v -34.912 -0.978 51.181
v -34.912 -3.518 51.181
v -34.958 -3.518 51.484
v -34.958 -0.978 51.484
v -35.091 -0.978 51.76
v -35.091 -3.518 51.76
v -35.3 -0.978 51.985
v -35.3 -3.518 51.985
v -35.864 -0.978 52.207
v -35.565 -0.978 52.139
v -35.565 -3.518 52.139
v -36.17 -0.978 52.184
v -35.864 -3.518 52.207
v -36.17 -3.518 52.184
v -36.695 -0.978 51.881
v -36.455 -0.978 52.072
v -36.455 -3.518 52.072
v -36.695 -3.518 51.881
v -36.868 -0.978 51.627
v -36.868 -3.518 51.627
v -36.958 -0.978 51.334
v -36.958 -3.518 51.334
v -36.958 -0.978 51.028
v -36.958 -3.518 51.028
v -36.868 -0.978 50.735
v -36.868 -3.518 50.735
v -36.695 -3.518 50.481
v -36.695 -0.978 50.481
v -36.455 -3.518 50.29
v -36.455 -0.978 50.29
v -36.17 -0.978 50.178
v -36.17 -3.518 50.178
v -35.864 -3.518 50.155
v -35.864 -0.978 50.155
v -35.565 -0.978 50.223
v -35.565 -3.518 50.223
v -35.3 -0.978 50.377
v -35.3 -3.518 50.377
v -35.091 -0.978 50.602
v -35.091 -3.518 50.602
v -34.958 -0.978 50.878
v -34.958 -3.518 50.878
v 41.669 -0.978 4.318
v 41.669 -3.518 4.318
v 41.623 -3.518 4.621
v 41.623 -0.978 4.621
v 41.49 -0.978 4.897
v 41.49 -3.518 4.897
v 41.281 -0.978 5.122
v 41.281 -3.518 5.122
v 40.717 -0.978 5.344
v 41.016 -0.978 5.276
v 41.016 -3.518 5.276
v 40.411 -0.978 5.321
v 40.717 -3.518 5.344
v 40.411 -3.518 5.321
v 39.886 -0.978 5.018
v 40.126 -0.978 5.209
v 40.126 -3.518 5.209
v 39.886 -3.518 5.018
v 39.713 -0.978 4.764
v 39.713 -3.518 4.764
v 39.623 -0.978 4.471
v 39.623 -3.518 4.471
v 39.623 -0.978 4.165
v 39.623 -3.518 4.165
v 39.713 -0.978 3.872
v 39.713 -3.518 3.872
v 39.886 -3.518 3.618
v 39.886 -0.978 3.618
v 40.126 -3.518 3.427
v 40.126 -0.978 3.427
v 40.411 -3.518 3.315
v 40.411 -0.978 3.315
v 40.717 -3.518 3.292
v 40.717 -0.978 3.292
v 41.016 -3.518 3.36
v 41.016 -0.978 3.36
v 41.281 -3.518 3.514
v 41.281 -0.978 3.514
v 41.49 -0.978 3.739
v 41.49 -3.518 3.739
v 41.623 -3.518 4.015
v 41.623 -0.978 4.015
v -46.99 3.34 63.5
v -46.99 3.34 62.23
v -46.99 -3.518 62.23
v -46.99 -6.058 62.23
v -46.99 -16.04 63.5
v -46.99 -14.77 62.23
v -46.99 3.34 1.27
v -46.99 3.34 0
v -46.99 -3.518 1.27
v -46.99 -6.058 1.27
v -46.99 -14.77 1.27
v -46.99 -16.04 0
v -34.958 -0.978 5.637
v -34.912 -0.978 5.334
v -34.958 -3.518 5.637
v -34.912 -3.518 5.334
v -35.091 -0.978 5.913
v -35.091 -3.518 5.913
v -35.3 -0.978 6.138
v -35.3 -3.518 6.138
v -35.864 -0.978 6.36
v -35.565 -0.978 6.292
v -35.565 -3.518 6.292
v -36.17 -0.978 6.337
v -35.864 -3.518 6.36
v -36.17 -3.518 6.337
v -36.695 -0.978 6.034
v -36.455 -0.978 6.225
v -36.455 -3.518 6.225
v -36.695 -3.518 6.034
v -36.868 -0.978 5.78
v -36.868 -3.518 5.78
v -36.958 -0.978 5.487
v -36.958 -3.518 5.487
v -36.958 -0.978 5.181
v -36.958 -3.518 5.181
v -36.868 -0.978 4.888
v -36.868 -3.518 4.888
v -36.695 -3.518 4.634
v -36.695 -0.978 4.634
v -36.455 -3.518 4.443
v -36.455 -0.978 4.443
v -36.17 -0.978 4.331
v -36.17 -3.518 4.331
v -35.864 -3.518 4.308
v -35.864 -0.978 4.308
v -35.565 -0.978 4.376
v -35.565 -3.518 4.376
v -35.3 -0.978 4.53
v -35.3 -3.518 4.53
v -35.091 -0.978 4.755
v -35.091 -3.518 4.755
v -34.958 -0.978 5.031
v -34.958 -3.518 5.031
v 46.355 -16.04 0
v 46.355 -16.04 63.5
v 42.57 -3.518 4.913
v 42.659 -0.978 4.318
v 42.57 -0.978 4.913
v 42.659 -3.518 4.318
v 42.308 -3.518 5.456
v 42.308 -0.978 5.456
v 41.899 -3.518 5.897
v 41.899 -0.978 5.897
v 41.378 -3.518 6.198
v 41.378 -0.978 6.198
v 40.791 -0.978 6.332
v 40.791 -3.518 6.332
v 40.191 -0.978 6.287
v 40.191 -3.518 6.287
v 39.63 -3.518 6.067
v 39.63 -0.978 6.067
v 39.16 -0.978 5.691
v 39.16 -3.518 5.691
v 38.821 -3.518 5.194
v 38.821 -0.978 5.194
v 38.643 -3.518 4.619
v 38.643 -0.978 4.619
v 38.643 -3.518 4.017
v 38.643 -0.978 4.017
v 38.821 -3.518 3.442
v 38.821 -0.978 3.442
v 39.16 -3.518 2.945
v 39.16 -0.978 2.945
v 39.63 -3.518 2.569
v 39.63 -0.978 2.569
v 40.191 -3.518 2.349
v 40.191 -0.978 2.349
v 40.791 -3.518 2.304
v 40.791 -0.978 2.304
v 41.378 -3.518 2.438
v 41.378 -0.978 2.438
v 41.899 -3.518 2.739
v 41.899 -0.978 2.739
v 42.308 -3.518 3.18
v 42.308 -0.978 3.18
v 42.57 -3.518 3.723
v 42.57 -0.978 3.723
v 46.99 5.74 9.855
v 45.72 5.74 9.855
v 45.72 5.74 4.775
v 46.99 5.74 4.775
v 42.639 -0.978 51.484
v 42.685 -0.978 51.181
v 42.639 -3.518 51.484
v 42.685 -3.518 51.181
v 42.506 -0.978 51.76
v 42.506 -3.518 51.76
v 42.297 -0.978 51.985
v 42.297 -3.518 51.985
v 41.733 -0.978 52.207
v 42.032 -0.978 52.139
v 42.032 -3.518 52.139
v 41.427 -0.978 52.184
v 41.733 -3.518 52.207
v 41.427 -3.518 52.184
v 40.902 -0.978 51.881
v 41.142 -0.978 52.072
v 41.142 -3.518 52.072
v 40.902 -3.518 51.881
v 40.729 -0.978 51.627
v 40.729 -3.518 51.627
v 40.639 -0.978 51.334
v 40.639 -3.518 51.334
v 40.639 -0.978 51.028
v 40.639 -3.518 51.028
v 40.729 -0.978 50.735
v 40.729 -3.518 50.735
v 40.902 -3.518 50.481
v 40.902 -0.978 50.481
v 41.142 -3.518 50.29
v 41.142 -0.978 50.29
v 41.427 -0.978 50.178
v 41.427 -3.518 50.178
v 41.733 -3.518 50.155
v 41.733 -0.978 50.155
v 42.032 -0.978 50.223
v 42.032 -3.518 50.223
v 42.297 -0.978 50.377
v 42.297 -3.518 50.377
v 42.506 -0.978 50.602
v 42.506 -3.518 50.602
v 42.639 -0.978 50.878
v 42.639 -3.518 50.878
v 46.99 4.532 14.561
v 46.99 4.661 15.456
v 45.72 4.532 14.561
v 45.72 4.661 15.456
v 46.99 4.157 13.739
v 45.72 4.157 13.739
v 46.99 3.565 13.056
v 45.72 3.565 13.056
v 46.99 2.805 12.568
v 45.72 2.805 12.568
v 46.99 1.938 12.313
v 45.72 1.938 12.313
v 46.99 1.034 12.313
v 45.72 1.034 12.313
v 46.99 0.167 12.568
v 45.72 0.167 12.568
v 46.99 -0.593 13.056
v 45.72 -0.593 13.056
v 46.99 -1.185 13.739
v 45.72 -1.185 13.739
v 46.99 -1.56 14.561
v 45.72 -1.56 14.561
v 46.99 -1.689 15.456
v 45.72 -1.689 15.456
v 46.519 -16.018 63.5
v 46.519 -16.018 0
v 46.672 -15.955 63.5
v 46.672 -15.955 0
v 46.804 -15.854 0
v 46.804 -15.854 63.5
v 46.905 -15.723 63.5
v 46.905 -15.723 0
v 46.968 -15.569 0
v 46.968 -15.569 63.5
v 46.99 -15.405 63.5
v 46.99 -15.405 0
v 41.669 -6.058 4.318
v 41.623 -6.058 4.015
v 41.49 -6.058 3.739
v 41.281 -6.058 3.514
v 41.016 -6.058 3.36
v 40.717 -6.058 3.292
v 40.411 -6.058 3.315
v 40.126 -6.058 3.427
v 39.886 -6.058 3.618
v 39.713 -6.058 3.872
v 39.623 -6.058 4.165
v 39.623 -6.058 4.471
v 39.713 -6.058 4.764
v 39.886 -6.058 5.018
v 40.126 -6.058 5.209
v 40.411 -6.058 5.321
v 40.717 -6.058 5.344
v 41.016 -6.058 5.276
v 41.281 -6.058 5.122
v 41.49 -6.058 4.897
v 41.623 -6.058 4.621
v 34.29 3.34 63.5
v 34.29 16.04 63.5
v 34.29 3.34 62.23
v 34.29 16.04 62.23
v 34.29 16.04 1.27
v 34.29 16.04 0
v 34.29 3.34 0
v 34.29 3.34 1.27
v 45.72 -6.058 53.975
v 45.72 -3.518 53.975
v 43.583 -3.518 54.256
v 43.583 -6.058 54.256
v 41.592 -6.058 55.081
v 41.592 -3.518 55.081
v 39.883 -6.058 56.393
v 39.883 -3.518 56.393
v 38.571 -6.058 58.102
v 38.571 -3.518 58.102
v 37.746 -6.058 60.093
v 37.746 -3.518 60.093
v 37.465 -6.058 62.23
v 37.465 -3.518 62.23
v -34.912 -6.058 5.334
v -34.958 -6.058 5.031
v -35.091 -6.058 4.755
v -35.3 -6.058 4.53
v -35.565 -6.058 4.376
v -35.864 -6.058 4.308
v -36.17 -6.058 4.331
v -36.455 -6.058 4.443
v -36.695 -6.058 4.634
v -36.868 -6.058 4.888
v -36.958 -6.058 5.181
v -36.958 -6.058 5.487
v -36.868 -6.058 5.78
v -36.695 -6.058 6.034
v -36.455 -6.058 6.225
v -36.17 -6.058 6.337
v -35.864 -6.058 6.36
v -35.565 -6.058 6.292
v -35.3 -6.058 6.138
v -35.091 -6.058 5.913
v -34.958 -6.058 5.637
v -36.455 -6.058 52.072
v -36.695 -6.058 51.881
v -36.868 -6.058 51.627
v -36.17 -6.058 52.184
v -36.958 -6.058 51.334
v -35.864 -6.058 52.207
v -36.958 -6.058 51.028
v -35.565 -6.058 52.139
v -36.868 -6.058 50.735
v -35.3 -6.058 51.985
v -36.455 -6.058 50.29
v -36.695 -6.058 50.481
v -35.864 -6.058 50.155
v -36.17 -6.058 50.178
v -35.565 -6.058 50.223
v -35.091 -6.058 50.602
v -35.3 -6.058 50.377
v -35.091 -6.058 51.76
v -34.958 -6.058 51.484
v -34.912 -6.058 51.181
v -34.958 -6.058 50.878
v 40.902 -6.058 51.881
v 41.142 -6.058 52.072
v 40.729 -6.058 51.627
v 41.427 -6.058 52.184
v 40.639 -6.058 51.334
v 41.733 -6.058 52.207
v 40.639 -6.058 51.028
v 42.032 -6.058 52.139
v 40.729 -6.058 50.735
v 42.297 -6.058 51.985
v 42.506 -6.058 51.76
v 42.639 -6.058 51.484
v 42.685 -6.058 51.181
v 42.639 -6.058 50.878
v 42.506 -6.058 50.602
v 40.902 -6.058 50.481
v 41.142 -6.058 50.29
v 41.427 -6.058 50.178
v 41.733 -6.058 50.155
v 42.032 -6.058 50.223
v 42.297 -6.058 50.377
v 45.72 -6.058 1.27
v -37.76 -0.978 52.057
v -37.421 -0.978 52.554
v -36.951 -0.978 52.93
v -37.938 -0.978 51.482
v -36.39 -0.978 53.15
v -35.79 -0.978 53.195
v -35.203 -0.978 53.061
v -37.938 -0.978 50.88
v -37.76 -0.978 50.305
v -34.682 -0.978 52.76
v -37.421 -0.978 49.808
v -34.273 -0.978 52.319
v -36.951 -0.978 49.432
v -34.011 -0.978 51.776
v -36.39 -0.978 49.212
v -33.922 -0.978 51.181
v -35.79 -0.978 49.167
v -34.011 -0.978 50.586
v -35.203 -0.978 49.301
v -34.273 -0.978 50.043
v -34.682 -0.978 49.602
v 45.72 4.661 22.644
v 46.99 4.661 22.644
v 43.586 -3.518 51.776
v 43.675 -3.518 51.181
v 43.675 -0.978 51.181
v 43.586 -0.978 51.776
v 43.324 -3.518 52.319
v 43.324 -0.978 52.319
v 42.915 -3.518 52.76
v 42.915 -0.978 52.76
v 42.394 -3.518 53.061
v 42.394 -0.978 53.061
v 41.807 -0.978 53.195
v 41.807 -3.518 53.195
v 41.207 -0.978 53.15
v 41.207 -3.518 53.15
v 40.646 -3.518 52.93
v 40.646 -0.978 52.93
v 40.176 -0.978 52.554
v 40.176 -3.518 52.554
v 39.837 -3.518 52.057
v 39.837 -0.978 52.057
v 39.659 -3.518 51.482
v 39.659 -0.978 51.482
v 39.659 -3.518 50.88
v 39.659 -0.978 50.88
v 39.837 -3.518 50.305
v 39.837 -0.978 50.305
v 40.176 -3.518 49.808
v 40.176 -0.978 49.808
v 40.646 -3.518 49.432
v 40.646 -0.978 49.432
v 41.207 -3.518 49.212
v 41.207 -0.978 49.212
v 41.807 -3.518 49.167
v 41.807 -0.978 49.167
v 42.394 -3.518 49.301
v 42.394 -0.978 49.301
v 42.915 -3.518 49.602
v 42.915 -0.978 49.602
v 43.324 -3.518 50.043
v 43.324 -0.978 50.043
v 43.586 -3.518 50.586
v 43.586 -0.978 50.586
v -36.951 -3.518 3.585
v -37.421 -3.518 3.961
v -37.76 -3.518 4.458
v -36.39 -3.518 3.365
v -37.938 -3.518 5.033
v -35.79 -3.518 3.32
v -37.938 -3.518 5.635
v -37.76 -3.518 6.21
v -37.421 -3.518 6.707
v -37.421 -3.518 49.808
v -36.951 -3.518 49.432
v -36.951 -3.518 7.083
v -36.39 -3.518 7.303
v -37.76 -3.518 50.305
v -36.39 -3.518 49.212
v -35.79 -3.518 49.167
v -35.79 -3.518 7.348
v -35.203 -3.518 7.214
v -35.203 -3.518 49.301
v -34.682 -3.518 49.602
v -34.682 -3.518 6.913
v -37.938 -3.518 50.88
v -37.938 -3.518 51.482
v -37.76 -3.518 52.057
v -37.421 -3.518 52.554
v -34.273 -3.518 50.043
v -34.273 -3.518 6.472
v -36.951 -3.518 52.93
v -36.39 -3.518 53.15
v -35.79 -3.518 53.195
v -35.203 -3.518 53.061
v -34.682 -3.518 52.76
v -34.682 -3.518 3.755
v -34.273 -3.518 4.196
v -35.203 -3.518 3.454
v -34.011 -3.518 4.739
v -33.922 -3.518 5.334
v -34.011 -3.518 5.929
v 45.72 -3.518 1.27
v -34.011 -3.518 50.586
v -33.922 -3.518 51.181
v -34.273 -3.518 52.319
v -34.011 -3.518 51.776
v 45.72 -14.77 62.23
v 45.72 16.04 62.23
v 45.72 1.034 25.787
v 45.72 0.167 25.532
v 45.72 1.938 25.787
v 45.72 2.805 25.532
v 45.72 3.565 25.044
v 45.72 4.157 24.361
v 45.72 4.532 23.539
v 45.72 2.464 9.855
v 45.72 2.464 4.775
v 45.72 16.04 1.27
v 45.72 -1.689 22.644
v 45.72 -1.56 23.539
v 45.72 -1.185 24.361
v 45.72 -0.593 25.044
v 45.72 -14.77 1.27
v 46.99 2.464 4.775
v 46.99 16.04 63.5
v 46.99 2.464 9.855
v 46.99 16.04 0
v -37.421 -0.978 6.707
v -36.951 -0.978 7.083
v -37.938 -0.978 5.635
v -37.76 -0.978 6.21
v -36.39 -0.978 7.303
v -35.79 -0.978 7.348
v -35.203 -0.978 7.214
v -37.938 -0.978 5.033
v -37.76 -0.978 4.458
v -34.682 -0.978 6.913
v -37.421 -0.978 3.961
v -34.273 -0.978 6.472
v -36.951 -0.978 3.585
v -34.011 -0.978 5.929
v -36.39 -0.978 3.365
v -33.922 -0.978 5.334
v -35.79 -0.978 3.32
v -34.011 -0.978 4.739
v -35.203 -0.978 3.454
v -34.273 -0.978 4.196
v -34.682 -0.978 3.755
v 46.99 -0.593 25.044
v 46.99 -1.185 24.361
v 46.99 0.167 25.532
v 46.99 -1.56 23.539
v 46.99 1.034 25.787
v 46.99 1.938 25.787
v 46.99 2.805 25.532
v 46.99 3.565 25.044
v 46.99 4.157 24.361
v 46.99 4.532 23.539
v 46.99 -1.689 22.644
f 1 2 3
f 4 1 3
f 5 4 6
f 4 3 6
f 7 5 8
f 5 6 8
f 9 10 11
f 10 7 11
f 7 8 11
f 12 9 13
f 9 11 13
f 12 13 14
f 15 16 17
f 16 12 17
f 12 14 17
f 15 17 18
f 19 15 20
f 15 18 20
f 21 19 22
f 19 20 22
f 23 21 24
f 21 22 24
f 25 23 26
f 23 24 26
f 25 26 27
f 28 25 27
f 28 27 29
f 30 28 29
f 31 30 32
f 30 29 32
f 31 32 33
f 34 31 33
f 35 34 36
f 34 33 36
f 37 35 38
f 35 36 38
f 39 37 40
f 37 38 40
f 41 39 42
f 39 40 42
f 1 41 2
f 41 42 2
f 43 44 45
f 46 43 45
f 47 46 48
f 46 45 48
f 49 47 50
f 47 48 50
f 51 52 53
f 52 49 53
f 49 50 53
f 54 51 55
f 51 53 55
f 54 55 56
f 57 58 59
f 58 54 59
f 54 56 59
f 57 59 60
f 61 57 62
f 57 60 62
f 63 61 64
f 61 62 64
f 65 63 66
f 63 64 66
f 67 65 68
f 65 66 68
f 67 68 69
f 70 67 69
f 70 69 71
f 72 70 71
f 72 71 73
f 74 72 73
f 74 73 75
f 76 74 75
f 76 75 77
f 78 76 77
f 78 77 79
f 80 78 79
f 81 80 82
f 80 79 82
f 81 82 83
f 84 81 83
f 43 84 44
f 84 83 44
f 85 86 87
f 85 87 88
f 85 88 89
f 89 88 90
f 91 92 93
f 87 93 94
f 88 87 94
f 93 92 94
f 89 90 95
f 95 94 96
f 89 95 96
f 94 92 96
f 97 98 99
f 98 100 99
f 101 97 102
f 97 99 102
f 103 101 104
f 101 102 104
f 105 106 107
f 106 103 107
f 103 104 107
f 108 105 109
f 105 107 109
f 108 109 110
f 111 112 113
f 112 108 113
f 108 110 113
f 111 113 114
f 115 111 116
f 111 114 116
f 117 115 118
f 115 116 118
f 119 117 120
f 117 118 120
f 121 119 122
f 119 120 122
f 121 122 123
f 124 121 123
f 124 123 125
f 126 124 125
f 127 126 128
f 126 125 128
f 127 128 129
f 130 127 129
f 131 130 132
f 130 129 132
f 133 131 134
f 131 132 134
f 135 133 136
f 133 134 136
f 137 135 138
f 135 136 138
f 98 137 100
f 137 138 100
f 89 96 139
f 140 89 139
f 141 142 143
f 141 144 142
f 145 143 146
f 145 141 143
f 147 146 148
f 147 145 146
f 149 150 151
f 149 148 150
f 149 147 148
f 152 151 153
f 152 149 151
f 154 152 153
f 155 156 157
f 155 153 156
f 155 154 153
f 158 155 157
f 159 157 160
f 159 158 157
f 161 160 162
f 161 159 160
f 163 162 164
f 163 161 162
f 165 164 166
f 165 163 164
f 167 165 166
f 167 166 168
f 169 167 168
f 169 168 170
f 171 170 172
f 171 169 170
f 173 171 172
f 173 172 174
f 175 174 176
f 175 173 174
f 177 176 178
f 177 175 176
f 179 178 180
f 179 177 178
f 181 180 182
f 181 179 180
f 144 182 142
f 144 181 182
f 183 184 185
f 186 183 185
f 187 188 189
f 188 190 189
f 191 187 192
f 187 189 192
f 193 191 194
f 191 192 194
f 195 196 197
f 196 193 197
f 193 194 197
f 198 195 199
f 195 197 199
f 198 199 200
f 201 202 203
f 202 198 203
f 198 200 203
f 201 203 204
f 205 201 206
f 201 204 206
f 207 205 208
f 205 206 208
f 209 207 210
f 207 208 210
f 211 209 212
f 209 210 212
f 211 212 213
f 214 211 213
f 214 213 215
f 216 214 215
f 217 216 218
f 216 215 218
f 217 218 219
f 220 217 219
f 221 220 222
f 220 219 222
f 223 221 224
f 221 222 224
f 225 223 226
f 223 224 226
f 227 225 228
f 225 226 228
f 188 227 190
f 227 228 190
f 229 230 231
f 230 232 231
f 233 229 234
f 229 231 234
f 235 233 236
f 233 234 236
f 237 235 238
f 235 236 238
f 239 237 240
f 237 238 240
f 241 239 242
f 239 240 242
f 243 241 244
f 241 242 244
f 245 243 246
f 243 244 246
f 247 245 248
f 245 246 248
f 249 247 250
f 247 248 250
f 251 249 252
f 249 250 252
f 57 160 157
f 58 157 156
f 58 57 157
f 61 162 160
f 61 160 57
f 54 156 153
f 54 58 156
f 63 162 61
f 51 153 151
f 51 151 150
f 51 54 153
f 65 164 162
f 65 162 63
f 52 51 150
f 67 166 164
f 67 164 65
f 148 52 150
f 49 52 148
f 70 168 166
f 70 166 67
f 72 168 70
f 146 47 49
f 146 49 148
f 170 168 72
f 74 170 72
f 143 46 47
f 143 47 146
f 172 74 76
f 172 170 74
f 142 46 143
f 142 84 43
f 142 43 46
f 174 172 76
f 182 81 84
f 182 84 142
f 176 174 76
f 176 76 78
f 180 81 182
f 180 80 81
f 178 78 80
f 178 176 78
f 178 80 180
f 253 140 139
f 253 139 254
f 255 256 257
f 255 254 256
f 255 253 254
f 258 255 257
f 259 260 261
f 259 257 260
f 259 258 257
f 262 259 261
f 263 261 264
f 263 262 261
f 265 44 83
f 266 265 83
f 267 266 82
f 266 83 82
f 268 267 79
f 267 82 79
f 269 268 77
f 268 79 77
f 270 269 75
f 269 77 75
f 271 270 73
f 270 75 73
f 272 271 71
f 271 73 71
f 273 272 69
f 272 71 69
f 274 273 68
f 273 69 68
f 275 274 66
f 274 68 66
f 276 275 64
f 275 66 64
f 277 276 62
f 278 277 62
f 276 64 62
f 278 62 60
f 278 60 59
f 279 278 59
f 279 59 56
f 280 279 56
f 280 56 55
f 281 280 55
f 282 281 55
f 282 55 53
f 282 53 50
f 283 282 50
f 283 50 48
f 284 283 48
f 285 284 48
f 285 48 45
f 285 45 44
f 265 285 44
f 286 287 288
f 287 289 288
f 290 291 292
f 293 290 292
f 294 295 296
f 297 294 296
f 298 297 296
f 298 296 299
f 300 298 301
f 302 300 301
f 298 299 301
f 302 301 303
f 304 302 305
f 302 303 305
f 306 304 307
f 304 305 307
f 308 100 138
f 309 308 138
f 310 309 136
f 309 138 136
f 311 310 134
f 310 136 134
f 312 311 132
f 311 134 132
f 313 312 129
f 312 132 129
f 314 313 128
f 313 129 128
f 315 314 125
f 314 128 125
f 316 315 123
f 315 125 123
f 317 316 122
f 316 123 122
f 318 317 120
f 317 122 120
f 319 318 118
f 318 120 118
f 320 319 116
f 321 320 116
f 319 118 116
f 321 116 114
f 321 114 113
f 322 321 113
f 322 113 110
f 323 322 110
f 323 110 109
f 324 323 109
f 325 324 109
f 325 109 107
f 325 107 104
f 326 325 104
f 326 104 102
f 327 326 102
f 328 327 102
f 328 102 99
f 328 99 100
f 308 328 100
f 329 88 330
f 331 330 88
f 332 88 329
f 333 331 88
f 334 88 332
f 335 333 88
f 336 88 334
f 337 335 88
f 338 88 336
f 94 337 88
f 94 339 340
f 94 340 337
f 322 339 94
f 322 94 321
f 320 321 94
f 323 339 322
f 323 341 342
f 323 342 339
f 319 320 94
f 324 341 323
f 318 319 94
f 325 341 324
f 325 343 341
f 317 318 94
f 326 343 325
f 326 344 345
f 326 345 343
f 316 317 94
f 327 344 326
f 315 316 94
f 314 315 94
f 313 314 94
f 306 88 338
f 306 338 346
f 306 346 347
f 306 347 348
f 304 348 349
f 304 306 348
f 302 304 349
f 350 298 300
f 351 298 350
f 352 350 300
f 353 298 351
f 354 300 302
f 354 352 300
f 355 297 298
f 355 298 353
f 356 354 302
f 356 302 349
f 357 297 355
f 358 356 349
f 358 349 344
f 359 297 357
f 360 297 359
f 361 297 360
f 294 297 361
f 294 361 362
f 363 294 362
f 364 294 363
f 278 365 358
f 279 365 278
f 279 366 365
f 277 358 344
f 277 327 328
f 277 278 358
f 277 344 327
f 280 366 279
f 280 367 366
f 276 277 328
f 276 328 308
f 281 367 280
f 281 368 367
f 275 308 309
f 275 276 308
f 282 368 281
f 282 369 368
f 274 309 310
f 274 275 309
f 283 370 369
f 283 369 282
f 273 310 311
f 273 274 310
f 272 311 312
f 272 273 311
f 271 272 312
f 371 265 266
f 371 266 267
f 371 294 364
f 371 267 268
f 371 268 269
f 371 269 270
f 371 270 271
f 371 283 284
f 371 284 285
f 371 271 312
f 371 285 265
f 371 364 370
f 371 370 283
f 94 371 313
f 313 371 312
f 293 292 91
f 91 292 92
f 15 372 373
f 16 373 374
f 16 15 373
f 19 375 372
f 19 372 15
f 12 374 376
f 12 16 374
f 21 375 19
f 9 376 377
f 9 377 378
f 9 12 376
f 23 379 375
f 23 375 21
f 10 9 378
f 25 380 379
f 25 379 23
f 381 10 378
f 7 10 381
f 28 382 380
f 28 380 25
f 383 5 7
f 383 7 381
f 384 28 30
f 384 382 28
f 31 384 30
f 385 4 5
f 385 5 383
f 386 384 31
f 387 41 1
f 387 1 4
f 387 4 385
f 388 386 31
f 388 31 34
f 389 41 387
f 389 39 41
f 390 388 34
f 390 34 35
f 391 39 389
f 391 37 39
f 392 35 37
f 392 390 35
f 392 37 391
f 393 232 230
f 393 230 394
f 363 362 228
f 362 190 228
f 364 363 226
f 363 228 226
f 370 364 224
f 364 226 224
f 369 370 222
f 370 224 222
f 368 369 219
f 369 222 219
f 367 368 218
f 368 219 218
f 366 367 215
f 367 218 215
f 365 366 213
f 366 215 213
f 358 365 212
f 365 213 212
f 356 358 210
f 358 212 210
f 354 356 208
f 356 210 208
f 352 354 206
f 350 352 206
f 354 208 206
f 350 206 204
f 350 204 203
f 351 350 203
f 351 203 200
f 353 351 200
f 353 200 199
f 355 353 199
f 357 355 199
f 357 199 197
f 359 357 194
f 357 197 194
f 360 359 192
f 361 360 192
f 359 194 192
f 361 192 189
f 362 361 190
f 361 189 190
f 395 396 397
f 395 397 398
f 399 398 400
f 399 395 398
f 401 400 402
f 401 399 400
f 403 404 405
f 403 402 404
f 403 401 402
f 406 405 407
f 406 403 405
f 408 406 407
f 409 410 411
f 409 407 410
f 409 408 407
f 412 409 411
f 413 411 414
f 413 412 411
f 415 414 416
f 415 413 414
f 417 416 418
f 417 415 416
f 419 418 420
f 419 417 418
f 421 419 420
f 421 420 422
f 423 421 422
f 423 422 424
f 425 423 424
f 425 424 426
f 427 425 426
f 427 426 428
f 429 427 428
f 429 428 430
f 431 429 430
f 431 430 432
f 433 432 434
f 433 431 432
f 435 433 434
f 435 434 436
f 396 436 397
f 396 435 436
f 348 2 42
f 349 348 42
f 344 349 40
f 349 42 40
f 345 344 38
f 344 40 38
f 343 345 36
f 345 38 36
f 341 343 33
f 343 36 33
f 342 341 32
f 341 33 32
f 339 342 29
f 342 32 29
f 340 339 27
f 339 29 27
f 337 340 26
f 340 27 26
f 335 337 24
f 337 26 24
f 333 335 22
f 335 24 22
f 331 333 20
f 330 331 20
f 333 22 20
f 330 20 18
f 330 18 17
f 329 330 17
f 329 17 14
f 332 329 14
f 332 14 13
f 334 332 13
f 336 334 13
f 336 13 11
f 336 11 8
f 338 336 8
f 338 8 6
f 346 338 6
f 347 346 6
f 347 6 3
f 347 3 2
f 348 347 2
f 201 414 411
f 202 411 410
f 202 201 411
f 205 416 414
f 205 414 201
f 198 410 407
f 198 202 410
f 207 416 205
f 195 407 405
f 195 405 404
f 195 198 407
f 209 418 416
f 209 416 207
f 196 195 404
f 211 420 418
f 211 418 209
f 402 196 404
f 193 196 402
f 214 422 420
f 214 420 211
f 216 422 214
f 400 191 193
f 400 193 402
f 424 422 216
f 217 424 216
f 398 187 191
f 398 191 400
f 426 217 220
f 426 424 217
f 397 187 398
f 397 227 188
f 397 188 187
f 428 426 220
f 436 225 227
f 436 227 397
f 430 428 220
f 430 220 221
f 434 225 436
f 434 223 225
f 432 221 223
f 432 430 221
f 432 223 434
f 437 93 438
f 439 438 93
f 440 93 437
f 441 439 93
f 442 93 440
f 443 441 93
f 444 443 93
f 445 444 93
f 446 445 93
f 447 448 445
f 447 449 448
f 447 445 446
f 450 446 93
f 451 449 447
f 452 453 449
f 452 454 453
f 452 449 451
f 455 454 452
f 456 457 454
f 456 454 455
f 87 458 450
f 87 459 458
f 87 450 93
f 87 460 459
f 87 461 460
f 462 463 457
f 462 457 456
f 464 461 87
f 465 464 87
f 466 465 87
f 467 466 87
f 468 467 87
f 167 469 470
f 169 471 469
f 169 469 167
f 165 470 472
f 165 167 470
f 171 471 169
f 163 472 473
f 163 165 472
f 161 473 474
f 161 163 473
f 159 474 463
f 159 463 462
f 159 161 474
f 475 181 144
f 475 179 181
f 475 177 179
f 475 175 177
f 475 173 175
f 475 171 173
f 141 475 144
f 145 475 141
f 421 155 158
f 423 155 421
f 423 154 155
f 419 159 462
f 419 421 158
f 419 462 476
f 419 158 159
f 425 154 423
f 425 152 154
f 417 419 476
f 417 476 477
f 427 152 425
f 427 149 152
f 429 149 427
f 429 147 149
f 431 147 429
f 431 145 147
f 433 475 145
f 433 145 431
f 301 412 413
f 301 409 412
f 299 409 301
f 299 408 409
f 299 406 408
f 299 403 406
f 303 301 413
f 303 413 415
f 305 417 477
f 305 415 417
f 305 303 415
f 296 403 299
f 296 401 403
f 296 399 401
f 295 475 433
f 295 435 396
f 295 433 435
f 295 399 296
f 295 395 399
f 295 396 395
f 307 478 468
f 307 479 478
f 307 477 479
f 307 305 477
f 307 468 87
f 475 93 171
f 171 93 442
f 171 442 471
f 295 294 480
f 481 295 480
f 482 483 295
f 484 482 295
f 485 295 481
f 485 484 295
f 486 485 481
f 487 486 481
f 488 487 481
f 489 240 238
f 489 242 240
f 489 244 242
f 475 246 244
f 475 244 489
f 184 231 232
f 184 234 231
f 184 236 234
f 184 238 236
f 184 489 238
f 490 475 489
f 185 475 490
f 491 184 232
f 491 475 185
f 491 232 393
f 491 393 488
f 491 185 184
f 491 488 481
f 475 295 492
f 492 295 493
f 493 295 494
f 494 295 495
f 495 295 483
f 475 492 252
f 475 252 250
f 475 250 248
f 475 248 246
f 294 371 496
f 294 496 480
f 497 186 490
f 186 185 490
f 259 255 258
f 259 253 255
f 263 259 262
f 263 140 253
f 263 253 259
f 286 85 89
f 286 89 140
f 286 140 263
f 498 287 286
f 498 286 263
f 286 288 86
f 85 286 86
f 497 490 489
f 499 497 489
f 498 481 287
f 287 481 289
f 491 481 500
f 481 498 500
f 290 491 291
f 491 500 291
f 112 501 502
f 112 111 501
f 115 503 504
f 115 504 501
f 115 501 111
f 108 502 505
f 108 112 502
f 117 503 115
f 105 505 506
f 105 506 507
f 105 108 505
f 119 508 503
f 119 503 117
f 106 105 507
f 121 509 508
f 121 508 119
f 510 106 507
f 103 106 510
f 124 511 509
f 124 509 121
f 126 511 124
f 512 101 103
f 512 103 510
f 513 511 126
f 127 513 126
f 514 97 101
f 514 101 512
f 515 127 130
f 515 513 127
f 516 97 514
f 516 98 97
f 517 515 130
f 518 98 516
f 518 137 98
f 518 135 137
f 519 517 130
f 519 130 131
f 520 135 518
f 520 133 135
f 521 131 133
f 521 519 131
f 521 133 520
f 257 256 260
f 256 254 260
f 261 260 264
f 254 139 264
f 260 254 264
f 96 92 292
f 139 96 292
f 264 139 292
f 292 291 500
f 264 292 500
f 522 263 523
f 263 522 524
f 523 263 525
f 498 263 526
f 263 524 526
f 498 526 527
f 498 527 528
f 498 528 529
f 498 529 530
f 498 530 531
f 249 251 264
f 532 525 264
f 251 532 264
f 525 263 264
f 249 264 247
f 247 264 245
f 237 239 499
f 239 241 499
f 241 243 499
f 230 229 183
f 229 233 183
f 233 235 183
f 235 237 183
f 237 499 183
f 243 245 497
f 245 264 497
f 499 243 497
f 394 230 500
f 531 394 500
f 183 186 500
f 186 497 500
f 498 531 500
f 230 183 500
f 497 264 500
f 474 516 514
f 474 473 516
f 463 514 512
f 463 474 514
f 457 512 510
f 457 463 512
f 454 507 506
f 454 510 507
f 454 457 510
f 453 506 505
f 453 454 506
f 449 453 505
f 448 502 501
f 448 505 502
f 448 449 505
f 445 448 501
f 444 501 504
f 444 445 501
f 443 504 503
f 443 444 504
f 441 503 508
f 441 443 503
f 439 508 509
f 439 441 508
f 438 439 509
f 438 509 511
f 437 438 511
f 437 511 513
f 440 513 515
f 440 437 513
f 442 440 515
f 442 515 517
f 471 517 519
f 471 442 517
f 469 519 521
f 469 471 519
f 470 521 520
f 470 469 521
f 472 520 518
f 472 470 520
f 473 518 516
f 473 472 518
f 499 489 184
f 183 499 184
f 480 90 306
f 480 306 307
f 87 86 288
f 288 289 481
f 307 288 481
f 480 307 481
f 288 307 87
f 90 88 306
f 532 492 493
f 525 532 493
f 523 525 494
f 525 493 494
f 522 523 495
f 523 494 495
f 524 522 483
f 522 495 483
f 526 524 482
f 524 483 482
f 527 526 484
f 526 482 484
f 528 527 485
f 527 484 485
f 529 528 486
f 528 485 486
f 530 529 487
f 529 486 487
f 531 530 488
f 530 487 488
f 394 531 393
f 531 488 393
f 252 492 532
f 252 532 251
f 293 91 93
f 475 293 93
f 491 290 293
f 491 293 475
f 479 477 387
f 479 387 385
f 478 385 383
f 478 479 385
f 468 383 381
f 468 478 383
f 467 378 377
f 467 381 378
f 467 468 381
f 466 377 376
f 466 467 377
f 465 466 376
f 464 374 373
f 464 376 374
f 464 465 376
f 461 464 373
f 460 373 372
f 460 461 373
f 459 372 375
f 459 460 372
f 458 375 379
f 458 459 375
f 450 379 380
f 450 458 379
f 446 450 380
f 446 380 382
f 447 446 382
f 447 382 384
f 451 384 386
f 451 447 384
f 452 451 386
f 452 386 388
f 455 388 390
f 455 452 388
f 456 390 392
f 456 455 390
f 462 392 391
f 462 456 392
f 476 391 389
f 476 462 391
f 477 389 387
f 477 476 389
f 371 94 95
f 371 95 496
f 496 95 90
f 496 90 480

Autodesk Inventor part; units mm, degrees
ref_plane "YZ Plane" through (0, 0, 0) normal (1, 0, 0) x (0, 1, 0)
ref_plane "XZ Plane" through (0, 0, 0) normal (0, 1, 0) x (-1, 0, 0)
ref_plane "XY Plane" through (0, 0, 0) normal (0, 0, 1) x (1, 0, 0)
sketch "Sketch1" plane through (0, 0, 0) normal (0, 0, 1) x (1, 0, 0)
  line L0 (-46.99, -16.0401) -> (46.99, -16.0401)
  line L1 (46.99, -16.0401) -> (46.99, 16.0401)
  line L2 (46.99, 16.0401) -> (-46.99, 16.0401)
  line L3 (-46.99, 16.0401) -> (-46.99, -16.0401)
  line L4 (-46.99, -16.0401) -> (46.99, 16.0401) construction
  line L5 (46.99, -16.0401) -> (-46.99, 16.0401) construction
  line L6 (46.99, 16.0401) -> (34.29, 16.0401)
  line L7 (34.29, 16.0401) -> (34.29, 3.3401)
  line L8 (34.29, 3.3401) -> (-46.99, 3.3401)
  point P0 (0, 0)
  dimension "d0" = 93.98
  dimension "d1" = 32.0802
  dimension "d2" = 12.7
  dimension "d3" = 12.7
extrude "Extrusion1" add sketch "Sketch1" along normal blind 63.5 contours L3 L8 L7 L2 L1 L0
shell "Shell1" thickness 1.27 removed faces 4 at (-46.99, -3.12, 21.1667) at (7.1967, 3.3401, 21.1667) at (34.29, 11.8068, 42.3333) at (42.7567, 16.0401, 21.1667)
sketch "Sketch2" plane through (45.72, -14.7701, 1.27) normal (-1, 0, 0) x (0, 0, 1)
  line L0 (0, 0) -> (0, 8.7122)
  line L1 (0, 8.7122) -> (0, 11.2522)
  line L2 (0, 0) -> (0, 30.8102) projected
  line L3 (0, 11.2522) -> (0, 16.3322)
  line L4 (0, 18.1102) -> (0, 30.8102) projected
  line L5 (0, 16.3322) -> (0, 30.8102)
  line L6 (0, 11.2522) -> (60.96, 11.2522)
  line L7 (60.96, 18.1102) -> (60.96, 0) projected
  line L8 (60.96, 8.7122) -> (0, 8.7122)
  point P0 (-1.27, 14.7701)
  point P1 (60.96, 8.7122)
  dimension "d7" = 8.7122
  dimension "d8" = 2.54
  dimension "d9" = 5.08
  dimension "d10" = 14.478
extrude "Extrusion2" add sketch "Sketch2" along normal up to surface (92.71 mm away)
sketch "Sketch3" plane through (45.72, -3.5179, 62.23) normal (0, 1, 0) x (1, 0, 0)
  line L0 (0, 0) -> (-11.43, 0) projected
  circle A0 centre (0, 0) radius 8.255
  line L1 (0, 60.96) -> (0, 0) projected
  line L2 (0, 8.255) -> (0, 0)
  line L3 (0, 0) -> (-8.255, 0)
  line L4 (-11.43, 60.96) -> (0, 60.96) projected
  line L5 (0, 60.96) -> (-85.725, 60.96)
  line L6 (-85.725, 60.96) -> (-85.725, 3.81)
  line L7 (-85.725, 3.81) -> (0, 3.81)
  line L8 (0, 3.81) -> (0, 60.96)
  arc A1 (-5.1304, 6.4672) -> (-2.2995, 7.9283) centre (0, 0) ccw
  line L9 (0, 0) -> (-92.71, 0) projected
  line L10 (0, 8.255) -> (0, 0)
  line L11 (0, 0) -> (-8.255, 0)
  point P0 (-45.72, 62.23)
  dimension "d13" = 16.51
  dimension "d37" = 85.725
  dimension "d38" = 57.15
extrude "Extrusion3" cut sketch "Sketch3" against normal up to surface (2.54 mm away) contours L0 A0 L7 L1 | L7 A0 L1
sketch "Sketch4" plane through (-46.99, -3.5179, 1.27) normal (0, 1, 0) x (1, 0, 0)
  line L0 (93.98, 1.27) -> (93.98, -62.23) projected
  line L1 (92.71, 0) -> (6.985, 0)
  line L2 (6.985, 0) -> (6.985, -53.975)
  line L3 (6.985, -53.975) -> (92.71, -53.975)
  line L4 (92.71, -53.975) -> (92.71, 0)
  circle A0 centre (87.63, -3.048) radius 1.0287
  circle A1 centre (88.646, -49.911) radius 1.0287
  circle A2 centre (11.049, -49.911) radius 1.0287
  circle A3 centre (11.049, -4.064) radius 1.0287
  circle A4 centre (11.049, -4.064) radius 2.0193
  circle A5 centre (11.049, -49.911) radius 2.0193
  circle A6 centre (87.63, -3.048) radius 2.0193
  circle A7 centre (88.646, -49.911) radius 2.0193
  point P0 (46.99, 1.27)
  dimension "d19" = 85.725
  dimension "d20" = 53.975
  dimension "d21" = 3.048
  dimension "d22" = 5.08
  dimension "d23" = 4.064
  dimension "d24" = 4.064
  dimension "d25" = 4.064
  dimension "d26" = 4.064
  dimension "d27" = 4.064
  dimension "d28" = 4.064
  dimension "d29" = 2.0574
  dimension "d30" = 2.0574
  dimension "d31" = 2.0574
  dimension "d32" = 2.0574
  dimension "d33" = 4.0386
  dimension "d34" = 4.0386
  dimension "d35" = 4.0386
  dimension "d36" = 4.0386
extrude "Extrusion4" add sketch "Sketch4" along normal blind 2.54 contours A4 | A5 | A6 | A7
sketch "Sketch5" plane through (-46.99, -3.5179, 1.27) normal (0, 1, 0) x (1, 0, 0)
  circle A0 centre (11.049, -4.064) radius 1.0287 projected
  circle A1 centre (87.63, -3.048) radius 1.0287 projected
  circle A2 centre (88.646, -49.911) radius 1.0287 projected
  circle A3 centre (11.049, -49.911) radius 1.0287 projected
  point P0 (46.99, 1.27)
extrude "Extrusion5" cut sketch "Sketch5" against normal blind 2.54
sketch "Sketch6" plane through (45.72, -14.7701, 62.23) normal (-1, 0, 0) x (0, 0, 1)
  line L0 (-57.4548, 17.2339) -> (-52.3748, 17.2339)
  line L1 (-52.3748, 17.2339) -> (-52.3748, 20.5105)
  line L2 (-52.3748, 20.5105) -> (-57.4548, 20.5105)
  line L3 (-57.4548, 20.5105) -> (-57.4548, 17.2339)
  line L4 (-57.4548, 17.2339) -> (-52.3748, 20.5105) construction
  line L5 (-52.3748, 17.2339) -> (-57.4548, 20.5105) construction
  line L6 (-54.8767, 13.7922) -> (-58.9153, 13.7922) projected
  line L7 (-62.23, 30.8102) -> (-62.23, 18.1102) projected
  line L8 (-62.23, 18.1102) -> (-62.23, -1.27) projected
  line L9 (-43.18, 13.081) -> (-39.5859, 13.081)
  line L10 (-43.18, 13.081) -> (-46.7741, 13.081)
  line L11 (-46.7741, 19.431) -> (-39.5859, 19.431)
  arc A0 (-46.7741, 19.431) -> (-46.7741, 13.081) centre (-46.7741, 16.256) ccw
  arc A1 (-39.5859, 13.081) -> (-39.5859, 19.431) centre (-39.5859, 16.256) ccw
  point P0 (-62.23, 14.7701)
  point P1 (-54.9148, 18.8722)
  point P2 (-43.18, 16.256)
  dimension "d46" = 5.08
  dimension "d47" = 3.2766
  dimension "d48" = 5.08
  dimension "d49" = 7.3152
  dimension "d62" = 19.05
  dimension "d63" = 2.4638
  dimension "d65" = 3.5941
  dimension "d66" = 3.5941
extrude "Extrusion6" cut sketch "Sketch6" against normal up to surface (1.27 mm away)
fillet "Fillet1" radius 0.635 1 edges at (46.99, -16.0401, 31.75)
properties part number "SD2104_case_design2"
